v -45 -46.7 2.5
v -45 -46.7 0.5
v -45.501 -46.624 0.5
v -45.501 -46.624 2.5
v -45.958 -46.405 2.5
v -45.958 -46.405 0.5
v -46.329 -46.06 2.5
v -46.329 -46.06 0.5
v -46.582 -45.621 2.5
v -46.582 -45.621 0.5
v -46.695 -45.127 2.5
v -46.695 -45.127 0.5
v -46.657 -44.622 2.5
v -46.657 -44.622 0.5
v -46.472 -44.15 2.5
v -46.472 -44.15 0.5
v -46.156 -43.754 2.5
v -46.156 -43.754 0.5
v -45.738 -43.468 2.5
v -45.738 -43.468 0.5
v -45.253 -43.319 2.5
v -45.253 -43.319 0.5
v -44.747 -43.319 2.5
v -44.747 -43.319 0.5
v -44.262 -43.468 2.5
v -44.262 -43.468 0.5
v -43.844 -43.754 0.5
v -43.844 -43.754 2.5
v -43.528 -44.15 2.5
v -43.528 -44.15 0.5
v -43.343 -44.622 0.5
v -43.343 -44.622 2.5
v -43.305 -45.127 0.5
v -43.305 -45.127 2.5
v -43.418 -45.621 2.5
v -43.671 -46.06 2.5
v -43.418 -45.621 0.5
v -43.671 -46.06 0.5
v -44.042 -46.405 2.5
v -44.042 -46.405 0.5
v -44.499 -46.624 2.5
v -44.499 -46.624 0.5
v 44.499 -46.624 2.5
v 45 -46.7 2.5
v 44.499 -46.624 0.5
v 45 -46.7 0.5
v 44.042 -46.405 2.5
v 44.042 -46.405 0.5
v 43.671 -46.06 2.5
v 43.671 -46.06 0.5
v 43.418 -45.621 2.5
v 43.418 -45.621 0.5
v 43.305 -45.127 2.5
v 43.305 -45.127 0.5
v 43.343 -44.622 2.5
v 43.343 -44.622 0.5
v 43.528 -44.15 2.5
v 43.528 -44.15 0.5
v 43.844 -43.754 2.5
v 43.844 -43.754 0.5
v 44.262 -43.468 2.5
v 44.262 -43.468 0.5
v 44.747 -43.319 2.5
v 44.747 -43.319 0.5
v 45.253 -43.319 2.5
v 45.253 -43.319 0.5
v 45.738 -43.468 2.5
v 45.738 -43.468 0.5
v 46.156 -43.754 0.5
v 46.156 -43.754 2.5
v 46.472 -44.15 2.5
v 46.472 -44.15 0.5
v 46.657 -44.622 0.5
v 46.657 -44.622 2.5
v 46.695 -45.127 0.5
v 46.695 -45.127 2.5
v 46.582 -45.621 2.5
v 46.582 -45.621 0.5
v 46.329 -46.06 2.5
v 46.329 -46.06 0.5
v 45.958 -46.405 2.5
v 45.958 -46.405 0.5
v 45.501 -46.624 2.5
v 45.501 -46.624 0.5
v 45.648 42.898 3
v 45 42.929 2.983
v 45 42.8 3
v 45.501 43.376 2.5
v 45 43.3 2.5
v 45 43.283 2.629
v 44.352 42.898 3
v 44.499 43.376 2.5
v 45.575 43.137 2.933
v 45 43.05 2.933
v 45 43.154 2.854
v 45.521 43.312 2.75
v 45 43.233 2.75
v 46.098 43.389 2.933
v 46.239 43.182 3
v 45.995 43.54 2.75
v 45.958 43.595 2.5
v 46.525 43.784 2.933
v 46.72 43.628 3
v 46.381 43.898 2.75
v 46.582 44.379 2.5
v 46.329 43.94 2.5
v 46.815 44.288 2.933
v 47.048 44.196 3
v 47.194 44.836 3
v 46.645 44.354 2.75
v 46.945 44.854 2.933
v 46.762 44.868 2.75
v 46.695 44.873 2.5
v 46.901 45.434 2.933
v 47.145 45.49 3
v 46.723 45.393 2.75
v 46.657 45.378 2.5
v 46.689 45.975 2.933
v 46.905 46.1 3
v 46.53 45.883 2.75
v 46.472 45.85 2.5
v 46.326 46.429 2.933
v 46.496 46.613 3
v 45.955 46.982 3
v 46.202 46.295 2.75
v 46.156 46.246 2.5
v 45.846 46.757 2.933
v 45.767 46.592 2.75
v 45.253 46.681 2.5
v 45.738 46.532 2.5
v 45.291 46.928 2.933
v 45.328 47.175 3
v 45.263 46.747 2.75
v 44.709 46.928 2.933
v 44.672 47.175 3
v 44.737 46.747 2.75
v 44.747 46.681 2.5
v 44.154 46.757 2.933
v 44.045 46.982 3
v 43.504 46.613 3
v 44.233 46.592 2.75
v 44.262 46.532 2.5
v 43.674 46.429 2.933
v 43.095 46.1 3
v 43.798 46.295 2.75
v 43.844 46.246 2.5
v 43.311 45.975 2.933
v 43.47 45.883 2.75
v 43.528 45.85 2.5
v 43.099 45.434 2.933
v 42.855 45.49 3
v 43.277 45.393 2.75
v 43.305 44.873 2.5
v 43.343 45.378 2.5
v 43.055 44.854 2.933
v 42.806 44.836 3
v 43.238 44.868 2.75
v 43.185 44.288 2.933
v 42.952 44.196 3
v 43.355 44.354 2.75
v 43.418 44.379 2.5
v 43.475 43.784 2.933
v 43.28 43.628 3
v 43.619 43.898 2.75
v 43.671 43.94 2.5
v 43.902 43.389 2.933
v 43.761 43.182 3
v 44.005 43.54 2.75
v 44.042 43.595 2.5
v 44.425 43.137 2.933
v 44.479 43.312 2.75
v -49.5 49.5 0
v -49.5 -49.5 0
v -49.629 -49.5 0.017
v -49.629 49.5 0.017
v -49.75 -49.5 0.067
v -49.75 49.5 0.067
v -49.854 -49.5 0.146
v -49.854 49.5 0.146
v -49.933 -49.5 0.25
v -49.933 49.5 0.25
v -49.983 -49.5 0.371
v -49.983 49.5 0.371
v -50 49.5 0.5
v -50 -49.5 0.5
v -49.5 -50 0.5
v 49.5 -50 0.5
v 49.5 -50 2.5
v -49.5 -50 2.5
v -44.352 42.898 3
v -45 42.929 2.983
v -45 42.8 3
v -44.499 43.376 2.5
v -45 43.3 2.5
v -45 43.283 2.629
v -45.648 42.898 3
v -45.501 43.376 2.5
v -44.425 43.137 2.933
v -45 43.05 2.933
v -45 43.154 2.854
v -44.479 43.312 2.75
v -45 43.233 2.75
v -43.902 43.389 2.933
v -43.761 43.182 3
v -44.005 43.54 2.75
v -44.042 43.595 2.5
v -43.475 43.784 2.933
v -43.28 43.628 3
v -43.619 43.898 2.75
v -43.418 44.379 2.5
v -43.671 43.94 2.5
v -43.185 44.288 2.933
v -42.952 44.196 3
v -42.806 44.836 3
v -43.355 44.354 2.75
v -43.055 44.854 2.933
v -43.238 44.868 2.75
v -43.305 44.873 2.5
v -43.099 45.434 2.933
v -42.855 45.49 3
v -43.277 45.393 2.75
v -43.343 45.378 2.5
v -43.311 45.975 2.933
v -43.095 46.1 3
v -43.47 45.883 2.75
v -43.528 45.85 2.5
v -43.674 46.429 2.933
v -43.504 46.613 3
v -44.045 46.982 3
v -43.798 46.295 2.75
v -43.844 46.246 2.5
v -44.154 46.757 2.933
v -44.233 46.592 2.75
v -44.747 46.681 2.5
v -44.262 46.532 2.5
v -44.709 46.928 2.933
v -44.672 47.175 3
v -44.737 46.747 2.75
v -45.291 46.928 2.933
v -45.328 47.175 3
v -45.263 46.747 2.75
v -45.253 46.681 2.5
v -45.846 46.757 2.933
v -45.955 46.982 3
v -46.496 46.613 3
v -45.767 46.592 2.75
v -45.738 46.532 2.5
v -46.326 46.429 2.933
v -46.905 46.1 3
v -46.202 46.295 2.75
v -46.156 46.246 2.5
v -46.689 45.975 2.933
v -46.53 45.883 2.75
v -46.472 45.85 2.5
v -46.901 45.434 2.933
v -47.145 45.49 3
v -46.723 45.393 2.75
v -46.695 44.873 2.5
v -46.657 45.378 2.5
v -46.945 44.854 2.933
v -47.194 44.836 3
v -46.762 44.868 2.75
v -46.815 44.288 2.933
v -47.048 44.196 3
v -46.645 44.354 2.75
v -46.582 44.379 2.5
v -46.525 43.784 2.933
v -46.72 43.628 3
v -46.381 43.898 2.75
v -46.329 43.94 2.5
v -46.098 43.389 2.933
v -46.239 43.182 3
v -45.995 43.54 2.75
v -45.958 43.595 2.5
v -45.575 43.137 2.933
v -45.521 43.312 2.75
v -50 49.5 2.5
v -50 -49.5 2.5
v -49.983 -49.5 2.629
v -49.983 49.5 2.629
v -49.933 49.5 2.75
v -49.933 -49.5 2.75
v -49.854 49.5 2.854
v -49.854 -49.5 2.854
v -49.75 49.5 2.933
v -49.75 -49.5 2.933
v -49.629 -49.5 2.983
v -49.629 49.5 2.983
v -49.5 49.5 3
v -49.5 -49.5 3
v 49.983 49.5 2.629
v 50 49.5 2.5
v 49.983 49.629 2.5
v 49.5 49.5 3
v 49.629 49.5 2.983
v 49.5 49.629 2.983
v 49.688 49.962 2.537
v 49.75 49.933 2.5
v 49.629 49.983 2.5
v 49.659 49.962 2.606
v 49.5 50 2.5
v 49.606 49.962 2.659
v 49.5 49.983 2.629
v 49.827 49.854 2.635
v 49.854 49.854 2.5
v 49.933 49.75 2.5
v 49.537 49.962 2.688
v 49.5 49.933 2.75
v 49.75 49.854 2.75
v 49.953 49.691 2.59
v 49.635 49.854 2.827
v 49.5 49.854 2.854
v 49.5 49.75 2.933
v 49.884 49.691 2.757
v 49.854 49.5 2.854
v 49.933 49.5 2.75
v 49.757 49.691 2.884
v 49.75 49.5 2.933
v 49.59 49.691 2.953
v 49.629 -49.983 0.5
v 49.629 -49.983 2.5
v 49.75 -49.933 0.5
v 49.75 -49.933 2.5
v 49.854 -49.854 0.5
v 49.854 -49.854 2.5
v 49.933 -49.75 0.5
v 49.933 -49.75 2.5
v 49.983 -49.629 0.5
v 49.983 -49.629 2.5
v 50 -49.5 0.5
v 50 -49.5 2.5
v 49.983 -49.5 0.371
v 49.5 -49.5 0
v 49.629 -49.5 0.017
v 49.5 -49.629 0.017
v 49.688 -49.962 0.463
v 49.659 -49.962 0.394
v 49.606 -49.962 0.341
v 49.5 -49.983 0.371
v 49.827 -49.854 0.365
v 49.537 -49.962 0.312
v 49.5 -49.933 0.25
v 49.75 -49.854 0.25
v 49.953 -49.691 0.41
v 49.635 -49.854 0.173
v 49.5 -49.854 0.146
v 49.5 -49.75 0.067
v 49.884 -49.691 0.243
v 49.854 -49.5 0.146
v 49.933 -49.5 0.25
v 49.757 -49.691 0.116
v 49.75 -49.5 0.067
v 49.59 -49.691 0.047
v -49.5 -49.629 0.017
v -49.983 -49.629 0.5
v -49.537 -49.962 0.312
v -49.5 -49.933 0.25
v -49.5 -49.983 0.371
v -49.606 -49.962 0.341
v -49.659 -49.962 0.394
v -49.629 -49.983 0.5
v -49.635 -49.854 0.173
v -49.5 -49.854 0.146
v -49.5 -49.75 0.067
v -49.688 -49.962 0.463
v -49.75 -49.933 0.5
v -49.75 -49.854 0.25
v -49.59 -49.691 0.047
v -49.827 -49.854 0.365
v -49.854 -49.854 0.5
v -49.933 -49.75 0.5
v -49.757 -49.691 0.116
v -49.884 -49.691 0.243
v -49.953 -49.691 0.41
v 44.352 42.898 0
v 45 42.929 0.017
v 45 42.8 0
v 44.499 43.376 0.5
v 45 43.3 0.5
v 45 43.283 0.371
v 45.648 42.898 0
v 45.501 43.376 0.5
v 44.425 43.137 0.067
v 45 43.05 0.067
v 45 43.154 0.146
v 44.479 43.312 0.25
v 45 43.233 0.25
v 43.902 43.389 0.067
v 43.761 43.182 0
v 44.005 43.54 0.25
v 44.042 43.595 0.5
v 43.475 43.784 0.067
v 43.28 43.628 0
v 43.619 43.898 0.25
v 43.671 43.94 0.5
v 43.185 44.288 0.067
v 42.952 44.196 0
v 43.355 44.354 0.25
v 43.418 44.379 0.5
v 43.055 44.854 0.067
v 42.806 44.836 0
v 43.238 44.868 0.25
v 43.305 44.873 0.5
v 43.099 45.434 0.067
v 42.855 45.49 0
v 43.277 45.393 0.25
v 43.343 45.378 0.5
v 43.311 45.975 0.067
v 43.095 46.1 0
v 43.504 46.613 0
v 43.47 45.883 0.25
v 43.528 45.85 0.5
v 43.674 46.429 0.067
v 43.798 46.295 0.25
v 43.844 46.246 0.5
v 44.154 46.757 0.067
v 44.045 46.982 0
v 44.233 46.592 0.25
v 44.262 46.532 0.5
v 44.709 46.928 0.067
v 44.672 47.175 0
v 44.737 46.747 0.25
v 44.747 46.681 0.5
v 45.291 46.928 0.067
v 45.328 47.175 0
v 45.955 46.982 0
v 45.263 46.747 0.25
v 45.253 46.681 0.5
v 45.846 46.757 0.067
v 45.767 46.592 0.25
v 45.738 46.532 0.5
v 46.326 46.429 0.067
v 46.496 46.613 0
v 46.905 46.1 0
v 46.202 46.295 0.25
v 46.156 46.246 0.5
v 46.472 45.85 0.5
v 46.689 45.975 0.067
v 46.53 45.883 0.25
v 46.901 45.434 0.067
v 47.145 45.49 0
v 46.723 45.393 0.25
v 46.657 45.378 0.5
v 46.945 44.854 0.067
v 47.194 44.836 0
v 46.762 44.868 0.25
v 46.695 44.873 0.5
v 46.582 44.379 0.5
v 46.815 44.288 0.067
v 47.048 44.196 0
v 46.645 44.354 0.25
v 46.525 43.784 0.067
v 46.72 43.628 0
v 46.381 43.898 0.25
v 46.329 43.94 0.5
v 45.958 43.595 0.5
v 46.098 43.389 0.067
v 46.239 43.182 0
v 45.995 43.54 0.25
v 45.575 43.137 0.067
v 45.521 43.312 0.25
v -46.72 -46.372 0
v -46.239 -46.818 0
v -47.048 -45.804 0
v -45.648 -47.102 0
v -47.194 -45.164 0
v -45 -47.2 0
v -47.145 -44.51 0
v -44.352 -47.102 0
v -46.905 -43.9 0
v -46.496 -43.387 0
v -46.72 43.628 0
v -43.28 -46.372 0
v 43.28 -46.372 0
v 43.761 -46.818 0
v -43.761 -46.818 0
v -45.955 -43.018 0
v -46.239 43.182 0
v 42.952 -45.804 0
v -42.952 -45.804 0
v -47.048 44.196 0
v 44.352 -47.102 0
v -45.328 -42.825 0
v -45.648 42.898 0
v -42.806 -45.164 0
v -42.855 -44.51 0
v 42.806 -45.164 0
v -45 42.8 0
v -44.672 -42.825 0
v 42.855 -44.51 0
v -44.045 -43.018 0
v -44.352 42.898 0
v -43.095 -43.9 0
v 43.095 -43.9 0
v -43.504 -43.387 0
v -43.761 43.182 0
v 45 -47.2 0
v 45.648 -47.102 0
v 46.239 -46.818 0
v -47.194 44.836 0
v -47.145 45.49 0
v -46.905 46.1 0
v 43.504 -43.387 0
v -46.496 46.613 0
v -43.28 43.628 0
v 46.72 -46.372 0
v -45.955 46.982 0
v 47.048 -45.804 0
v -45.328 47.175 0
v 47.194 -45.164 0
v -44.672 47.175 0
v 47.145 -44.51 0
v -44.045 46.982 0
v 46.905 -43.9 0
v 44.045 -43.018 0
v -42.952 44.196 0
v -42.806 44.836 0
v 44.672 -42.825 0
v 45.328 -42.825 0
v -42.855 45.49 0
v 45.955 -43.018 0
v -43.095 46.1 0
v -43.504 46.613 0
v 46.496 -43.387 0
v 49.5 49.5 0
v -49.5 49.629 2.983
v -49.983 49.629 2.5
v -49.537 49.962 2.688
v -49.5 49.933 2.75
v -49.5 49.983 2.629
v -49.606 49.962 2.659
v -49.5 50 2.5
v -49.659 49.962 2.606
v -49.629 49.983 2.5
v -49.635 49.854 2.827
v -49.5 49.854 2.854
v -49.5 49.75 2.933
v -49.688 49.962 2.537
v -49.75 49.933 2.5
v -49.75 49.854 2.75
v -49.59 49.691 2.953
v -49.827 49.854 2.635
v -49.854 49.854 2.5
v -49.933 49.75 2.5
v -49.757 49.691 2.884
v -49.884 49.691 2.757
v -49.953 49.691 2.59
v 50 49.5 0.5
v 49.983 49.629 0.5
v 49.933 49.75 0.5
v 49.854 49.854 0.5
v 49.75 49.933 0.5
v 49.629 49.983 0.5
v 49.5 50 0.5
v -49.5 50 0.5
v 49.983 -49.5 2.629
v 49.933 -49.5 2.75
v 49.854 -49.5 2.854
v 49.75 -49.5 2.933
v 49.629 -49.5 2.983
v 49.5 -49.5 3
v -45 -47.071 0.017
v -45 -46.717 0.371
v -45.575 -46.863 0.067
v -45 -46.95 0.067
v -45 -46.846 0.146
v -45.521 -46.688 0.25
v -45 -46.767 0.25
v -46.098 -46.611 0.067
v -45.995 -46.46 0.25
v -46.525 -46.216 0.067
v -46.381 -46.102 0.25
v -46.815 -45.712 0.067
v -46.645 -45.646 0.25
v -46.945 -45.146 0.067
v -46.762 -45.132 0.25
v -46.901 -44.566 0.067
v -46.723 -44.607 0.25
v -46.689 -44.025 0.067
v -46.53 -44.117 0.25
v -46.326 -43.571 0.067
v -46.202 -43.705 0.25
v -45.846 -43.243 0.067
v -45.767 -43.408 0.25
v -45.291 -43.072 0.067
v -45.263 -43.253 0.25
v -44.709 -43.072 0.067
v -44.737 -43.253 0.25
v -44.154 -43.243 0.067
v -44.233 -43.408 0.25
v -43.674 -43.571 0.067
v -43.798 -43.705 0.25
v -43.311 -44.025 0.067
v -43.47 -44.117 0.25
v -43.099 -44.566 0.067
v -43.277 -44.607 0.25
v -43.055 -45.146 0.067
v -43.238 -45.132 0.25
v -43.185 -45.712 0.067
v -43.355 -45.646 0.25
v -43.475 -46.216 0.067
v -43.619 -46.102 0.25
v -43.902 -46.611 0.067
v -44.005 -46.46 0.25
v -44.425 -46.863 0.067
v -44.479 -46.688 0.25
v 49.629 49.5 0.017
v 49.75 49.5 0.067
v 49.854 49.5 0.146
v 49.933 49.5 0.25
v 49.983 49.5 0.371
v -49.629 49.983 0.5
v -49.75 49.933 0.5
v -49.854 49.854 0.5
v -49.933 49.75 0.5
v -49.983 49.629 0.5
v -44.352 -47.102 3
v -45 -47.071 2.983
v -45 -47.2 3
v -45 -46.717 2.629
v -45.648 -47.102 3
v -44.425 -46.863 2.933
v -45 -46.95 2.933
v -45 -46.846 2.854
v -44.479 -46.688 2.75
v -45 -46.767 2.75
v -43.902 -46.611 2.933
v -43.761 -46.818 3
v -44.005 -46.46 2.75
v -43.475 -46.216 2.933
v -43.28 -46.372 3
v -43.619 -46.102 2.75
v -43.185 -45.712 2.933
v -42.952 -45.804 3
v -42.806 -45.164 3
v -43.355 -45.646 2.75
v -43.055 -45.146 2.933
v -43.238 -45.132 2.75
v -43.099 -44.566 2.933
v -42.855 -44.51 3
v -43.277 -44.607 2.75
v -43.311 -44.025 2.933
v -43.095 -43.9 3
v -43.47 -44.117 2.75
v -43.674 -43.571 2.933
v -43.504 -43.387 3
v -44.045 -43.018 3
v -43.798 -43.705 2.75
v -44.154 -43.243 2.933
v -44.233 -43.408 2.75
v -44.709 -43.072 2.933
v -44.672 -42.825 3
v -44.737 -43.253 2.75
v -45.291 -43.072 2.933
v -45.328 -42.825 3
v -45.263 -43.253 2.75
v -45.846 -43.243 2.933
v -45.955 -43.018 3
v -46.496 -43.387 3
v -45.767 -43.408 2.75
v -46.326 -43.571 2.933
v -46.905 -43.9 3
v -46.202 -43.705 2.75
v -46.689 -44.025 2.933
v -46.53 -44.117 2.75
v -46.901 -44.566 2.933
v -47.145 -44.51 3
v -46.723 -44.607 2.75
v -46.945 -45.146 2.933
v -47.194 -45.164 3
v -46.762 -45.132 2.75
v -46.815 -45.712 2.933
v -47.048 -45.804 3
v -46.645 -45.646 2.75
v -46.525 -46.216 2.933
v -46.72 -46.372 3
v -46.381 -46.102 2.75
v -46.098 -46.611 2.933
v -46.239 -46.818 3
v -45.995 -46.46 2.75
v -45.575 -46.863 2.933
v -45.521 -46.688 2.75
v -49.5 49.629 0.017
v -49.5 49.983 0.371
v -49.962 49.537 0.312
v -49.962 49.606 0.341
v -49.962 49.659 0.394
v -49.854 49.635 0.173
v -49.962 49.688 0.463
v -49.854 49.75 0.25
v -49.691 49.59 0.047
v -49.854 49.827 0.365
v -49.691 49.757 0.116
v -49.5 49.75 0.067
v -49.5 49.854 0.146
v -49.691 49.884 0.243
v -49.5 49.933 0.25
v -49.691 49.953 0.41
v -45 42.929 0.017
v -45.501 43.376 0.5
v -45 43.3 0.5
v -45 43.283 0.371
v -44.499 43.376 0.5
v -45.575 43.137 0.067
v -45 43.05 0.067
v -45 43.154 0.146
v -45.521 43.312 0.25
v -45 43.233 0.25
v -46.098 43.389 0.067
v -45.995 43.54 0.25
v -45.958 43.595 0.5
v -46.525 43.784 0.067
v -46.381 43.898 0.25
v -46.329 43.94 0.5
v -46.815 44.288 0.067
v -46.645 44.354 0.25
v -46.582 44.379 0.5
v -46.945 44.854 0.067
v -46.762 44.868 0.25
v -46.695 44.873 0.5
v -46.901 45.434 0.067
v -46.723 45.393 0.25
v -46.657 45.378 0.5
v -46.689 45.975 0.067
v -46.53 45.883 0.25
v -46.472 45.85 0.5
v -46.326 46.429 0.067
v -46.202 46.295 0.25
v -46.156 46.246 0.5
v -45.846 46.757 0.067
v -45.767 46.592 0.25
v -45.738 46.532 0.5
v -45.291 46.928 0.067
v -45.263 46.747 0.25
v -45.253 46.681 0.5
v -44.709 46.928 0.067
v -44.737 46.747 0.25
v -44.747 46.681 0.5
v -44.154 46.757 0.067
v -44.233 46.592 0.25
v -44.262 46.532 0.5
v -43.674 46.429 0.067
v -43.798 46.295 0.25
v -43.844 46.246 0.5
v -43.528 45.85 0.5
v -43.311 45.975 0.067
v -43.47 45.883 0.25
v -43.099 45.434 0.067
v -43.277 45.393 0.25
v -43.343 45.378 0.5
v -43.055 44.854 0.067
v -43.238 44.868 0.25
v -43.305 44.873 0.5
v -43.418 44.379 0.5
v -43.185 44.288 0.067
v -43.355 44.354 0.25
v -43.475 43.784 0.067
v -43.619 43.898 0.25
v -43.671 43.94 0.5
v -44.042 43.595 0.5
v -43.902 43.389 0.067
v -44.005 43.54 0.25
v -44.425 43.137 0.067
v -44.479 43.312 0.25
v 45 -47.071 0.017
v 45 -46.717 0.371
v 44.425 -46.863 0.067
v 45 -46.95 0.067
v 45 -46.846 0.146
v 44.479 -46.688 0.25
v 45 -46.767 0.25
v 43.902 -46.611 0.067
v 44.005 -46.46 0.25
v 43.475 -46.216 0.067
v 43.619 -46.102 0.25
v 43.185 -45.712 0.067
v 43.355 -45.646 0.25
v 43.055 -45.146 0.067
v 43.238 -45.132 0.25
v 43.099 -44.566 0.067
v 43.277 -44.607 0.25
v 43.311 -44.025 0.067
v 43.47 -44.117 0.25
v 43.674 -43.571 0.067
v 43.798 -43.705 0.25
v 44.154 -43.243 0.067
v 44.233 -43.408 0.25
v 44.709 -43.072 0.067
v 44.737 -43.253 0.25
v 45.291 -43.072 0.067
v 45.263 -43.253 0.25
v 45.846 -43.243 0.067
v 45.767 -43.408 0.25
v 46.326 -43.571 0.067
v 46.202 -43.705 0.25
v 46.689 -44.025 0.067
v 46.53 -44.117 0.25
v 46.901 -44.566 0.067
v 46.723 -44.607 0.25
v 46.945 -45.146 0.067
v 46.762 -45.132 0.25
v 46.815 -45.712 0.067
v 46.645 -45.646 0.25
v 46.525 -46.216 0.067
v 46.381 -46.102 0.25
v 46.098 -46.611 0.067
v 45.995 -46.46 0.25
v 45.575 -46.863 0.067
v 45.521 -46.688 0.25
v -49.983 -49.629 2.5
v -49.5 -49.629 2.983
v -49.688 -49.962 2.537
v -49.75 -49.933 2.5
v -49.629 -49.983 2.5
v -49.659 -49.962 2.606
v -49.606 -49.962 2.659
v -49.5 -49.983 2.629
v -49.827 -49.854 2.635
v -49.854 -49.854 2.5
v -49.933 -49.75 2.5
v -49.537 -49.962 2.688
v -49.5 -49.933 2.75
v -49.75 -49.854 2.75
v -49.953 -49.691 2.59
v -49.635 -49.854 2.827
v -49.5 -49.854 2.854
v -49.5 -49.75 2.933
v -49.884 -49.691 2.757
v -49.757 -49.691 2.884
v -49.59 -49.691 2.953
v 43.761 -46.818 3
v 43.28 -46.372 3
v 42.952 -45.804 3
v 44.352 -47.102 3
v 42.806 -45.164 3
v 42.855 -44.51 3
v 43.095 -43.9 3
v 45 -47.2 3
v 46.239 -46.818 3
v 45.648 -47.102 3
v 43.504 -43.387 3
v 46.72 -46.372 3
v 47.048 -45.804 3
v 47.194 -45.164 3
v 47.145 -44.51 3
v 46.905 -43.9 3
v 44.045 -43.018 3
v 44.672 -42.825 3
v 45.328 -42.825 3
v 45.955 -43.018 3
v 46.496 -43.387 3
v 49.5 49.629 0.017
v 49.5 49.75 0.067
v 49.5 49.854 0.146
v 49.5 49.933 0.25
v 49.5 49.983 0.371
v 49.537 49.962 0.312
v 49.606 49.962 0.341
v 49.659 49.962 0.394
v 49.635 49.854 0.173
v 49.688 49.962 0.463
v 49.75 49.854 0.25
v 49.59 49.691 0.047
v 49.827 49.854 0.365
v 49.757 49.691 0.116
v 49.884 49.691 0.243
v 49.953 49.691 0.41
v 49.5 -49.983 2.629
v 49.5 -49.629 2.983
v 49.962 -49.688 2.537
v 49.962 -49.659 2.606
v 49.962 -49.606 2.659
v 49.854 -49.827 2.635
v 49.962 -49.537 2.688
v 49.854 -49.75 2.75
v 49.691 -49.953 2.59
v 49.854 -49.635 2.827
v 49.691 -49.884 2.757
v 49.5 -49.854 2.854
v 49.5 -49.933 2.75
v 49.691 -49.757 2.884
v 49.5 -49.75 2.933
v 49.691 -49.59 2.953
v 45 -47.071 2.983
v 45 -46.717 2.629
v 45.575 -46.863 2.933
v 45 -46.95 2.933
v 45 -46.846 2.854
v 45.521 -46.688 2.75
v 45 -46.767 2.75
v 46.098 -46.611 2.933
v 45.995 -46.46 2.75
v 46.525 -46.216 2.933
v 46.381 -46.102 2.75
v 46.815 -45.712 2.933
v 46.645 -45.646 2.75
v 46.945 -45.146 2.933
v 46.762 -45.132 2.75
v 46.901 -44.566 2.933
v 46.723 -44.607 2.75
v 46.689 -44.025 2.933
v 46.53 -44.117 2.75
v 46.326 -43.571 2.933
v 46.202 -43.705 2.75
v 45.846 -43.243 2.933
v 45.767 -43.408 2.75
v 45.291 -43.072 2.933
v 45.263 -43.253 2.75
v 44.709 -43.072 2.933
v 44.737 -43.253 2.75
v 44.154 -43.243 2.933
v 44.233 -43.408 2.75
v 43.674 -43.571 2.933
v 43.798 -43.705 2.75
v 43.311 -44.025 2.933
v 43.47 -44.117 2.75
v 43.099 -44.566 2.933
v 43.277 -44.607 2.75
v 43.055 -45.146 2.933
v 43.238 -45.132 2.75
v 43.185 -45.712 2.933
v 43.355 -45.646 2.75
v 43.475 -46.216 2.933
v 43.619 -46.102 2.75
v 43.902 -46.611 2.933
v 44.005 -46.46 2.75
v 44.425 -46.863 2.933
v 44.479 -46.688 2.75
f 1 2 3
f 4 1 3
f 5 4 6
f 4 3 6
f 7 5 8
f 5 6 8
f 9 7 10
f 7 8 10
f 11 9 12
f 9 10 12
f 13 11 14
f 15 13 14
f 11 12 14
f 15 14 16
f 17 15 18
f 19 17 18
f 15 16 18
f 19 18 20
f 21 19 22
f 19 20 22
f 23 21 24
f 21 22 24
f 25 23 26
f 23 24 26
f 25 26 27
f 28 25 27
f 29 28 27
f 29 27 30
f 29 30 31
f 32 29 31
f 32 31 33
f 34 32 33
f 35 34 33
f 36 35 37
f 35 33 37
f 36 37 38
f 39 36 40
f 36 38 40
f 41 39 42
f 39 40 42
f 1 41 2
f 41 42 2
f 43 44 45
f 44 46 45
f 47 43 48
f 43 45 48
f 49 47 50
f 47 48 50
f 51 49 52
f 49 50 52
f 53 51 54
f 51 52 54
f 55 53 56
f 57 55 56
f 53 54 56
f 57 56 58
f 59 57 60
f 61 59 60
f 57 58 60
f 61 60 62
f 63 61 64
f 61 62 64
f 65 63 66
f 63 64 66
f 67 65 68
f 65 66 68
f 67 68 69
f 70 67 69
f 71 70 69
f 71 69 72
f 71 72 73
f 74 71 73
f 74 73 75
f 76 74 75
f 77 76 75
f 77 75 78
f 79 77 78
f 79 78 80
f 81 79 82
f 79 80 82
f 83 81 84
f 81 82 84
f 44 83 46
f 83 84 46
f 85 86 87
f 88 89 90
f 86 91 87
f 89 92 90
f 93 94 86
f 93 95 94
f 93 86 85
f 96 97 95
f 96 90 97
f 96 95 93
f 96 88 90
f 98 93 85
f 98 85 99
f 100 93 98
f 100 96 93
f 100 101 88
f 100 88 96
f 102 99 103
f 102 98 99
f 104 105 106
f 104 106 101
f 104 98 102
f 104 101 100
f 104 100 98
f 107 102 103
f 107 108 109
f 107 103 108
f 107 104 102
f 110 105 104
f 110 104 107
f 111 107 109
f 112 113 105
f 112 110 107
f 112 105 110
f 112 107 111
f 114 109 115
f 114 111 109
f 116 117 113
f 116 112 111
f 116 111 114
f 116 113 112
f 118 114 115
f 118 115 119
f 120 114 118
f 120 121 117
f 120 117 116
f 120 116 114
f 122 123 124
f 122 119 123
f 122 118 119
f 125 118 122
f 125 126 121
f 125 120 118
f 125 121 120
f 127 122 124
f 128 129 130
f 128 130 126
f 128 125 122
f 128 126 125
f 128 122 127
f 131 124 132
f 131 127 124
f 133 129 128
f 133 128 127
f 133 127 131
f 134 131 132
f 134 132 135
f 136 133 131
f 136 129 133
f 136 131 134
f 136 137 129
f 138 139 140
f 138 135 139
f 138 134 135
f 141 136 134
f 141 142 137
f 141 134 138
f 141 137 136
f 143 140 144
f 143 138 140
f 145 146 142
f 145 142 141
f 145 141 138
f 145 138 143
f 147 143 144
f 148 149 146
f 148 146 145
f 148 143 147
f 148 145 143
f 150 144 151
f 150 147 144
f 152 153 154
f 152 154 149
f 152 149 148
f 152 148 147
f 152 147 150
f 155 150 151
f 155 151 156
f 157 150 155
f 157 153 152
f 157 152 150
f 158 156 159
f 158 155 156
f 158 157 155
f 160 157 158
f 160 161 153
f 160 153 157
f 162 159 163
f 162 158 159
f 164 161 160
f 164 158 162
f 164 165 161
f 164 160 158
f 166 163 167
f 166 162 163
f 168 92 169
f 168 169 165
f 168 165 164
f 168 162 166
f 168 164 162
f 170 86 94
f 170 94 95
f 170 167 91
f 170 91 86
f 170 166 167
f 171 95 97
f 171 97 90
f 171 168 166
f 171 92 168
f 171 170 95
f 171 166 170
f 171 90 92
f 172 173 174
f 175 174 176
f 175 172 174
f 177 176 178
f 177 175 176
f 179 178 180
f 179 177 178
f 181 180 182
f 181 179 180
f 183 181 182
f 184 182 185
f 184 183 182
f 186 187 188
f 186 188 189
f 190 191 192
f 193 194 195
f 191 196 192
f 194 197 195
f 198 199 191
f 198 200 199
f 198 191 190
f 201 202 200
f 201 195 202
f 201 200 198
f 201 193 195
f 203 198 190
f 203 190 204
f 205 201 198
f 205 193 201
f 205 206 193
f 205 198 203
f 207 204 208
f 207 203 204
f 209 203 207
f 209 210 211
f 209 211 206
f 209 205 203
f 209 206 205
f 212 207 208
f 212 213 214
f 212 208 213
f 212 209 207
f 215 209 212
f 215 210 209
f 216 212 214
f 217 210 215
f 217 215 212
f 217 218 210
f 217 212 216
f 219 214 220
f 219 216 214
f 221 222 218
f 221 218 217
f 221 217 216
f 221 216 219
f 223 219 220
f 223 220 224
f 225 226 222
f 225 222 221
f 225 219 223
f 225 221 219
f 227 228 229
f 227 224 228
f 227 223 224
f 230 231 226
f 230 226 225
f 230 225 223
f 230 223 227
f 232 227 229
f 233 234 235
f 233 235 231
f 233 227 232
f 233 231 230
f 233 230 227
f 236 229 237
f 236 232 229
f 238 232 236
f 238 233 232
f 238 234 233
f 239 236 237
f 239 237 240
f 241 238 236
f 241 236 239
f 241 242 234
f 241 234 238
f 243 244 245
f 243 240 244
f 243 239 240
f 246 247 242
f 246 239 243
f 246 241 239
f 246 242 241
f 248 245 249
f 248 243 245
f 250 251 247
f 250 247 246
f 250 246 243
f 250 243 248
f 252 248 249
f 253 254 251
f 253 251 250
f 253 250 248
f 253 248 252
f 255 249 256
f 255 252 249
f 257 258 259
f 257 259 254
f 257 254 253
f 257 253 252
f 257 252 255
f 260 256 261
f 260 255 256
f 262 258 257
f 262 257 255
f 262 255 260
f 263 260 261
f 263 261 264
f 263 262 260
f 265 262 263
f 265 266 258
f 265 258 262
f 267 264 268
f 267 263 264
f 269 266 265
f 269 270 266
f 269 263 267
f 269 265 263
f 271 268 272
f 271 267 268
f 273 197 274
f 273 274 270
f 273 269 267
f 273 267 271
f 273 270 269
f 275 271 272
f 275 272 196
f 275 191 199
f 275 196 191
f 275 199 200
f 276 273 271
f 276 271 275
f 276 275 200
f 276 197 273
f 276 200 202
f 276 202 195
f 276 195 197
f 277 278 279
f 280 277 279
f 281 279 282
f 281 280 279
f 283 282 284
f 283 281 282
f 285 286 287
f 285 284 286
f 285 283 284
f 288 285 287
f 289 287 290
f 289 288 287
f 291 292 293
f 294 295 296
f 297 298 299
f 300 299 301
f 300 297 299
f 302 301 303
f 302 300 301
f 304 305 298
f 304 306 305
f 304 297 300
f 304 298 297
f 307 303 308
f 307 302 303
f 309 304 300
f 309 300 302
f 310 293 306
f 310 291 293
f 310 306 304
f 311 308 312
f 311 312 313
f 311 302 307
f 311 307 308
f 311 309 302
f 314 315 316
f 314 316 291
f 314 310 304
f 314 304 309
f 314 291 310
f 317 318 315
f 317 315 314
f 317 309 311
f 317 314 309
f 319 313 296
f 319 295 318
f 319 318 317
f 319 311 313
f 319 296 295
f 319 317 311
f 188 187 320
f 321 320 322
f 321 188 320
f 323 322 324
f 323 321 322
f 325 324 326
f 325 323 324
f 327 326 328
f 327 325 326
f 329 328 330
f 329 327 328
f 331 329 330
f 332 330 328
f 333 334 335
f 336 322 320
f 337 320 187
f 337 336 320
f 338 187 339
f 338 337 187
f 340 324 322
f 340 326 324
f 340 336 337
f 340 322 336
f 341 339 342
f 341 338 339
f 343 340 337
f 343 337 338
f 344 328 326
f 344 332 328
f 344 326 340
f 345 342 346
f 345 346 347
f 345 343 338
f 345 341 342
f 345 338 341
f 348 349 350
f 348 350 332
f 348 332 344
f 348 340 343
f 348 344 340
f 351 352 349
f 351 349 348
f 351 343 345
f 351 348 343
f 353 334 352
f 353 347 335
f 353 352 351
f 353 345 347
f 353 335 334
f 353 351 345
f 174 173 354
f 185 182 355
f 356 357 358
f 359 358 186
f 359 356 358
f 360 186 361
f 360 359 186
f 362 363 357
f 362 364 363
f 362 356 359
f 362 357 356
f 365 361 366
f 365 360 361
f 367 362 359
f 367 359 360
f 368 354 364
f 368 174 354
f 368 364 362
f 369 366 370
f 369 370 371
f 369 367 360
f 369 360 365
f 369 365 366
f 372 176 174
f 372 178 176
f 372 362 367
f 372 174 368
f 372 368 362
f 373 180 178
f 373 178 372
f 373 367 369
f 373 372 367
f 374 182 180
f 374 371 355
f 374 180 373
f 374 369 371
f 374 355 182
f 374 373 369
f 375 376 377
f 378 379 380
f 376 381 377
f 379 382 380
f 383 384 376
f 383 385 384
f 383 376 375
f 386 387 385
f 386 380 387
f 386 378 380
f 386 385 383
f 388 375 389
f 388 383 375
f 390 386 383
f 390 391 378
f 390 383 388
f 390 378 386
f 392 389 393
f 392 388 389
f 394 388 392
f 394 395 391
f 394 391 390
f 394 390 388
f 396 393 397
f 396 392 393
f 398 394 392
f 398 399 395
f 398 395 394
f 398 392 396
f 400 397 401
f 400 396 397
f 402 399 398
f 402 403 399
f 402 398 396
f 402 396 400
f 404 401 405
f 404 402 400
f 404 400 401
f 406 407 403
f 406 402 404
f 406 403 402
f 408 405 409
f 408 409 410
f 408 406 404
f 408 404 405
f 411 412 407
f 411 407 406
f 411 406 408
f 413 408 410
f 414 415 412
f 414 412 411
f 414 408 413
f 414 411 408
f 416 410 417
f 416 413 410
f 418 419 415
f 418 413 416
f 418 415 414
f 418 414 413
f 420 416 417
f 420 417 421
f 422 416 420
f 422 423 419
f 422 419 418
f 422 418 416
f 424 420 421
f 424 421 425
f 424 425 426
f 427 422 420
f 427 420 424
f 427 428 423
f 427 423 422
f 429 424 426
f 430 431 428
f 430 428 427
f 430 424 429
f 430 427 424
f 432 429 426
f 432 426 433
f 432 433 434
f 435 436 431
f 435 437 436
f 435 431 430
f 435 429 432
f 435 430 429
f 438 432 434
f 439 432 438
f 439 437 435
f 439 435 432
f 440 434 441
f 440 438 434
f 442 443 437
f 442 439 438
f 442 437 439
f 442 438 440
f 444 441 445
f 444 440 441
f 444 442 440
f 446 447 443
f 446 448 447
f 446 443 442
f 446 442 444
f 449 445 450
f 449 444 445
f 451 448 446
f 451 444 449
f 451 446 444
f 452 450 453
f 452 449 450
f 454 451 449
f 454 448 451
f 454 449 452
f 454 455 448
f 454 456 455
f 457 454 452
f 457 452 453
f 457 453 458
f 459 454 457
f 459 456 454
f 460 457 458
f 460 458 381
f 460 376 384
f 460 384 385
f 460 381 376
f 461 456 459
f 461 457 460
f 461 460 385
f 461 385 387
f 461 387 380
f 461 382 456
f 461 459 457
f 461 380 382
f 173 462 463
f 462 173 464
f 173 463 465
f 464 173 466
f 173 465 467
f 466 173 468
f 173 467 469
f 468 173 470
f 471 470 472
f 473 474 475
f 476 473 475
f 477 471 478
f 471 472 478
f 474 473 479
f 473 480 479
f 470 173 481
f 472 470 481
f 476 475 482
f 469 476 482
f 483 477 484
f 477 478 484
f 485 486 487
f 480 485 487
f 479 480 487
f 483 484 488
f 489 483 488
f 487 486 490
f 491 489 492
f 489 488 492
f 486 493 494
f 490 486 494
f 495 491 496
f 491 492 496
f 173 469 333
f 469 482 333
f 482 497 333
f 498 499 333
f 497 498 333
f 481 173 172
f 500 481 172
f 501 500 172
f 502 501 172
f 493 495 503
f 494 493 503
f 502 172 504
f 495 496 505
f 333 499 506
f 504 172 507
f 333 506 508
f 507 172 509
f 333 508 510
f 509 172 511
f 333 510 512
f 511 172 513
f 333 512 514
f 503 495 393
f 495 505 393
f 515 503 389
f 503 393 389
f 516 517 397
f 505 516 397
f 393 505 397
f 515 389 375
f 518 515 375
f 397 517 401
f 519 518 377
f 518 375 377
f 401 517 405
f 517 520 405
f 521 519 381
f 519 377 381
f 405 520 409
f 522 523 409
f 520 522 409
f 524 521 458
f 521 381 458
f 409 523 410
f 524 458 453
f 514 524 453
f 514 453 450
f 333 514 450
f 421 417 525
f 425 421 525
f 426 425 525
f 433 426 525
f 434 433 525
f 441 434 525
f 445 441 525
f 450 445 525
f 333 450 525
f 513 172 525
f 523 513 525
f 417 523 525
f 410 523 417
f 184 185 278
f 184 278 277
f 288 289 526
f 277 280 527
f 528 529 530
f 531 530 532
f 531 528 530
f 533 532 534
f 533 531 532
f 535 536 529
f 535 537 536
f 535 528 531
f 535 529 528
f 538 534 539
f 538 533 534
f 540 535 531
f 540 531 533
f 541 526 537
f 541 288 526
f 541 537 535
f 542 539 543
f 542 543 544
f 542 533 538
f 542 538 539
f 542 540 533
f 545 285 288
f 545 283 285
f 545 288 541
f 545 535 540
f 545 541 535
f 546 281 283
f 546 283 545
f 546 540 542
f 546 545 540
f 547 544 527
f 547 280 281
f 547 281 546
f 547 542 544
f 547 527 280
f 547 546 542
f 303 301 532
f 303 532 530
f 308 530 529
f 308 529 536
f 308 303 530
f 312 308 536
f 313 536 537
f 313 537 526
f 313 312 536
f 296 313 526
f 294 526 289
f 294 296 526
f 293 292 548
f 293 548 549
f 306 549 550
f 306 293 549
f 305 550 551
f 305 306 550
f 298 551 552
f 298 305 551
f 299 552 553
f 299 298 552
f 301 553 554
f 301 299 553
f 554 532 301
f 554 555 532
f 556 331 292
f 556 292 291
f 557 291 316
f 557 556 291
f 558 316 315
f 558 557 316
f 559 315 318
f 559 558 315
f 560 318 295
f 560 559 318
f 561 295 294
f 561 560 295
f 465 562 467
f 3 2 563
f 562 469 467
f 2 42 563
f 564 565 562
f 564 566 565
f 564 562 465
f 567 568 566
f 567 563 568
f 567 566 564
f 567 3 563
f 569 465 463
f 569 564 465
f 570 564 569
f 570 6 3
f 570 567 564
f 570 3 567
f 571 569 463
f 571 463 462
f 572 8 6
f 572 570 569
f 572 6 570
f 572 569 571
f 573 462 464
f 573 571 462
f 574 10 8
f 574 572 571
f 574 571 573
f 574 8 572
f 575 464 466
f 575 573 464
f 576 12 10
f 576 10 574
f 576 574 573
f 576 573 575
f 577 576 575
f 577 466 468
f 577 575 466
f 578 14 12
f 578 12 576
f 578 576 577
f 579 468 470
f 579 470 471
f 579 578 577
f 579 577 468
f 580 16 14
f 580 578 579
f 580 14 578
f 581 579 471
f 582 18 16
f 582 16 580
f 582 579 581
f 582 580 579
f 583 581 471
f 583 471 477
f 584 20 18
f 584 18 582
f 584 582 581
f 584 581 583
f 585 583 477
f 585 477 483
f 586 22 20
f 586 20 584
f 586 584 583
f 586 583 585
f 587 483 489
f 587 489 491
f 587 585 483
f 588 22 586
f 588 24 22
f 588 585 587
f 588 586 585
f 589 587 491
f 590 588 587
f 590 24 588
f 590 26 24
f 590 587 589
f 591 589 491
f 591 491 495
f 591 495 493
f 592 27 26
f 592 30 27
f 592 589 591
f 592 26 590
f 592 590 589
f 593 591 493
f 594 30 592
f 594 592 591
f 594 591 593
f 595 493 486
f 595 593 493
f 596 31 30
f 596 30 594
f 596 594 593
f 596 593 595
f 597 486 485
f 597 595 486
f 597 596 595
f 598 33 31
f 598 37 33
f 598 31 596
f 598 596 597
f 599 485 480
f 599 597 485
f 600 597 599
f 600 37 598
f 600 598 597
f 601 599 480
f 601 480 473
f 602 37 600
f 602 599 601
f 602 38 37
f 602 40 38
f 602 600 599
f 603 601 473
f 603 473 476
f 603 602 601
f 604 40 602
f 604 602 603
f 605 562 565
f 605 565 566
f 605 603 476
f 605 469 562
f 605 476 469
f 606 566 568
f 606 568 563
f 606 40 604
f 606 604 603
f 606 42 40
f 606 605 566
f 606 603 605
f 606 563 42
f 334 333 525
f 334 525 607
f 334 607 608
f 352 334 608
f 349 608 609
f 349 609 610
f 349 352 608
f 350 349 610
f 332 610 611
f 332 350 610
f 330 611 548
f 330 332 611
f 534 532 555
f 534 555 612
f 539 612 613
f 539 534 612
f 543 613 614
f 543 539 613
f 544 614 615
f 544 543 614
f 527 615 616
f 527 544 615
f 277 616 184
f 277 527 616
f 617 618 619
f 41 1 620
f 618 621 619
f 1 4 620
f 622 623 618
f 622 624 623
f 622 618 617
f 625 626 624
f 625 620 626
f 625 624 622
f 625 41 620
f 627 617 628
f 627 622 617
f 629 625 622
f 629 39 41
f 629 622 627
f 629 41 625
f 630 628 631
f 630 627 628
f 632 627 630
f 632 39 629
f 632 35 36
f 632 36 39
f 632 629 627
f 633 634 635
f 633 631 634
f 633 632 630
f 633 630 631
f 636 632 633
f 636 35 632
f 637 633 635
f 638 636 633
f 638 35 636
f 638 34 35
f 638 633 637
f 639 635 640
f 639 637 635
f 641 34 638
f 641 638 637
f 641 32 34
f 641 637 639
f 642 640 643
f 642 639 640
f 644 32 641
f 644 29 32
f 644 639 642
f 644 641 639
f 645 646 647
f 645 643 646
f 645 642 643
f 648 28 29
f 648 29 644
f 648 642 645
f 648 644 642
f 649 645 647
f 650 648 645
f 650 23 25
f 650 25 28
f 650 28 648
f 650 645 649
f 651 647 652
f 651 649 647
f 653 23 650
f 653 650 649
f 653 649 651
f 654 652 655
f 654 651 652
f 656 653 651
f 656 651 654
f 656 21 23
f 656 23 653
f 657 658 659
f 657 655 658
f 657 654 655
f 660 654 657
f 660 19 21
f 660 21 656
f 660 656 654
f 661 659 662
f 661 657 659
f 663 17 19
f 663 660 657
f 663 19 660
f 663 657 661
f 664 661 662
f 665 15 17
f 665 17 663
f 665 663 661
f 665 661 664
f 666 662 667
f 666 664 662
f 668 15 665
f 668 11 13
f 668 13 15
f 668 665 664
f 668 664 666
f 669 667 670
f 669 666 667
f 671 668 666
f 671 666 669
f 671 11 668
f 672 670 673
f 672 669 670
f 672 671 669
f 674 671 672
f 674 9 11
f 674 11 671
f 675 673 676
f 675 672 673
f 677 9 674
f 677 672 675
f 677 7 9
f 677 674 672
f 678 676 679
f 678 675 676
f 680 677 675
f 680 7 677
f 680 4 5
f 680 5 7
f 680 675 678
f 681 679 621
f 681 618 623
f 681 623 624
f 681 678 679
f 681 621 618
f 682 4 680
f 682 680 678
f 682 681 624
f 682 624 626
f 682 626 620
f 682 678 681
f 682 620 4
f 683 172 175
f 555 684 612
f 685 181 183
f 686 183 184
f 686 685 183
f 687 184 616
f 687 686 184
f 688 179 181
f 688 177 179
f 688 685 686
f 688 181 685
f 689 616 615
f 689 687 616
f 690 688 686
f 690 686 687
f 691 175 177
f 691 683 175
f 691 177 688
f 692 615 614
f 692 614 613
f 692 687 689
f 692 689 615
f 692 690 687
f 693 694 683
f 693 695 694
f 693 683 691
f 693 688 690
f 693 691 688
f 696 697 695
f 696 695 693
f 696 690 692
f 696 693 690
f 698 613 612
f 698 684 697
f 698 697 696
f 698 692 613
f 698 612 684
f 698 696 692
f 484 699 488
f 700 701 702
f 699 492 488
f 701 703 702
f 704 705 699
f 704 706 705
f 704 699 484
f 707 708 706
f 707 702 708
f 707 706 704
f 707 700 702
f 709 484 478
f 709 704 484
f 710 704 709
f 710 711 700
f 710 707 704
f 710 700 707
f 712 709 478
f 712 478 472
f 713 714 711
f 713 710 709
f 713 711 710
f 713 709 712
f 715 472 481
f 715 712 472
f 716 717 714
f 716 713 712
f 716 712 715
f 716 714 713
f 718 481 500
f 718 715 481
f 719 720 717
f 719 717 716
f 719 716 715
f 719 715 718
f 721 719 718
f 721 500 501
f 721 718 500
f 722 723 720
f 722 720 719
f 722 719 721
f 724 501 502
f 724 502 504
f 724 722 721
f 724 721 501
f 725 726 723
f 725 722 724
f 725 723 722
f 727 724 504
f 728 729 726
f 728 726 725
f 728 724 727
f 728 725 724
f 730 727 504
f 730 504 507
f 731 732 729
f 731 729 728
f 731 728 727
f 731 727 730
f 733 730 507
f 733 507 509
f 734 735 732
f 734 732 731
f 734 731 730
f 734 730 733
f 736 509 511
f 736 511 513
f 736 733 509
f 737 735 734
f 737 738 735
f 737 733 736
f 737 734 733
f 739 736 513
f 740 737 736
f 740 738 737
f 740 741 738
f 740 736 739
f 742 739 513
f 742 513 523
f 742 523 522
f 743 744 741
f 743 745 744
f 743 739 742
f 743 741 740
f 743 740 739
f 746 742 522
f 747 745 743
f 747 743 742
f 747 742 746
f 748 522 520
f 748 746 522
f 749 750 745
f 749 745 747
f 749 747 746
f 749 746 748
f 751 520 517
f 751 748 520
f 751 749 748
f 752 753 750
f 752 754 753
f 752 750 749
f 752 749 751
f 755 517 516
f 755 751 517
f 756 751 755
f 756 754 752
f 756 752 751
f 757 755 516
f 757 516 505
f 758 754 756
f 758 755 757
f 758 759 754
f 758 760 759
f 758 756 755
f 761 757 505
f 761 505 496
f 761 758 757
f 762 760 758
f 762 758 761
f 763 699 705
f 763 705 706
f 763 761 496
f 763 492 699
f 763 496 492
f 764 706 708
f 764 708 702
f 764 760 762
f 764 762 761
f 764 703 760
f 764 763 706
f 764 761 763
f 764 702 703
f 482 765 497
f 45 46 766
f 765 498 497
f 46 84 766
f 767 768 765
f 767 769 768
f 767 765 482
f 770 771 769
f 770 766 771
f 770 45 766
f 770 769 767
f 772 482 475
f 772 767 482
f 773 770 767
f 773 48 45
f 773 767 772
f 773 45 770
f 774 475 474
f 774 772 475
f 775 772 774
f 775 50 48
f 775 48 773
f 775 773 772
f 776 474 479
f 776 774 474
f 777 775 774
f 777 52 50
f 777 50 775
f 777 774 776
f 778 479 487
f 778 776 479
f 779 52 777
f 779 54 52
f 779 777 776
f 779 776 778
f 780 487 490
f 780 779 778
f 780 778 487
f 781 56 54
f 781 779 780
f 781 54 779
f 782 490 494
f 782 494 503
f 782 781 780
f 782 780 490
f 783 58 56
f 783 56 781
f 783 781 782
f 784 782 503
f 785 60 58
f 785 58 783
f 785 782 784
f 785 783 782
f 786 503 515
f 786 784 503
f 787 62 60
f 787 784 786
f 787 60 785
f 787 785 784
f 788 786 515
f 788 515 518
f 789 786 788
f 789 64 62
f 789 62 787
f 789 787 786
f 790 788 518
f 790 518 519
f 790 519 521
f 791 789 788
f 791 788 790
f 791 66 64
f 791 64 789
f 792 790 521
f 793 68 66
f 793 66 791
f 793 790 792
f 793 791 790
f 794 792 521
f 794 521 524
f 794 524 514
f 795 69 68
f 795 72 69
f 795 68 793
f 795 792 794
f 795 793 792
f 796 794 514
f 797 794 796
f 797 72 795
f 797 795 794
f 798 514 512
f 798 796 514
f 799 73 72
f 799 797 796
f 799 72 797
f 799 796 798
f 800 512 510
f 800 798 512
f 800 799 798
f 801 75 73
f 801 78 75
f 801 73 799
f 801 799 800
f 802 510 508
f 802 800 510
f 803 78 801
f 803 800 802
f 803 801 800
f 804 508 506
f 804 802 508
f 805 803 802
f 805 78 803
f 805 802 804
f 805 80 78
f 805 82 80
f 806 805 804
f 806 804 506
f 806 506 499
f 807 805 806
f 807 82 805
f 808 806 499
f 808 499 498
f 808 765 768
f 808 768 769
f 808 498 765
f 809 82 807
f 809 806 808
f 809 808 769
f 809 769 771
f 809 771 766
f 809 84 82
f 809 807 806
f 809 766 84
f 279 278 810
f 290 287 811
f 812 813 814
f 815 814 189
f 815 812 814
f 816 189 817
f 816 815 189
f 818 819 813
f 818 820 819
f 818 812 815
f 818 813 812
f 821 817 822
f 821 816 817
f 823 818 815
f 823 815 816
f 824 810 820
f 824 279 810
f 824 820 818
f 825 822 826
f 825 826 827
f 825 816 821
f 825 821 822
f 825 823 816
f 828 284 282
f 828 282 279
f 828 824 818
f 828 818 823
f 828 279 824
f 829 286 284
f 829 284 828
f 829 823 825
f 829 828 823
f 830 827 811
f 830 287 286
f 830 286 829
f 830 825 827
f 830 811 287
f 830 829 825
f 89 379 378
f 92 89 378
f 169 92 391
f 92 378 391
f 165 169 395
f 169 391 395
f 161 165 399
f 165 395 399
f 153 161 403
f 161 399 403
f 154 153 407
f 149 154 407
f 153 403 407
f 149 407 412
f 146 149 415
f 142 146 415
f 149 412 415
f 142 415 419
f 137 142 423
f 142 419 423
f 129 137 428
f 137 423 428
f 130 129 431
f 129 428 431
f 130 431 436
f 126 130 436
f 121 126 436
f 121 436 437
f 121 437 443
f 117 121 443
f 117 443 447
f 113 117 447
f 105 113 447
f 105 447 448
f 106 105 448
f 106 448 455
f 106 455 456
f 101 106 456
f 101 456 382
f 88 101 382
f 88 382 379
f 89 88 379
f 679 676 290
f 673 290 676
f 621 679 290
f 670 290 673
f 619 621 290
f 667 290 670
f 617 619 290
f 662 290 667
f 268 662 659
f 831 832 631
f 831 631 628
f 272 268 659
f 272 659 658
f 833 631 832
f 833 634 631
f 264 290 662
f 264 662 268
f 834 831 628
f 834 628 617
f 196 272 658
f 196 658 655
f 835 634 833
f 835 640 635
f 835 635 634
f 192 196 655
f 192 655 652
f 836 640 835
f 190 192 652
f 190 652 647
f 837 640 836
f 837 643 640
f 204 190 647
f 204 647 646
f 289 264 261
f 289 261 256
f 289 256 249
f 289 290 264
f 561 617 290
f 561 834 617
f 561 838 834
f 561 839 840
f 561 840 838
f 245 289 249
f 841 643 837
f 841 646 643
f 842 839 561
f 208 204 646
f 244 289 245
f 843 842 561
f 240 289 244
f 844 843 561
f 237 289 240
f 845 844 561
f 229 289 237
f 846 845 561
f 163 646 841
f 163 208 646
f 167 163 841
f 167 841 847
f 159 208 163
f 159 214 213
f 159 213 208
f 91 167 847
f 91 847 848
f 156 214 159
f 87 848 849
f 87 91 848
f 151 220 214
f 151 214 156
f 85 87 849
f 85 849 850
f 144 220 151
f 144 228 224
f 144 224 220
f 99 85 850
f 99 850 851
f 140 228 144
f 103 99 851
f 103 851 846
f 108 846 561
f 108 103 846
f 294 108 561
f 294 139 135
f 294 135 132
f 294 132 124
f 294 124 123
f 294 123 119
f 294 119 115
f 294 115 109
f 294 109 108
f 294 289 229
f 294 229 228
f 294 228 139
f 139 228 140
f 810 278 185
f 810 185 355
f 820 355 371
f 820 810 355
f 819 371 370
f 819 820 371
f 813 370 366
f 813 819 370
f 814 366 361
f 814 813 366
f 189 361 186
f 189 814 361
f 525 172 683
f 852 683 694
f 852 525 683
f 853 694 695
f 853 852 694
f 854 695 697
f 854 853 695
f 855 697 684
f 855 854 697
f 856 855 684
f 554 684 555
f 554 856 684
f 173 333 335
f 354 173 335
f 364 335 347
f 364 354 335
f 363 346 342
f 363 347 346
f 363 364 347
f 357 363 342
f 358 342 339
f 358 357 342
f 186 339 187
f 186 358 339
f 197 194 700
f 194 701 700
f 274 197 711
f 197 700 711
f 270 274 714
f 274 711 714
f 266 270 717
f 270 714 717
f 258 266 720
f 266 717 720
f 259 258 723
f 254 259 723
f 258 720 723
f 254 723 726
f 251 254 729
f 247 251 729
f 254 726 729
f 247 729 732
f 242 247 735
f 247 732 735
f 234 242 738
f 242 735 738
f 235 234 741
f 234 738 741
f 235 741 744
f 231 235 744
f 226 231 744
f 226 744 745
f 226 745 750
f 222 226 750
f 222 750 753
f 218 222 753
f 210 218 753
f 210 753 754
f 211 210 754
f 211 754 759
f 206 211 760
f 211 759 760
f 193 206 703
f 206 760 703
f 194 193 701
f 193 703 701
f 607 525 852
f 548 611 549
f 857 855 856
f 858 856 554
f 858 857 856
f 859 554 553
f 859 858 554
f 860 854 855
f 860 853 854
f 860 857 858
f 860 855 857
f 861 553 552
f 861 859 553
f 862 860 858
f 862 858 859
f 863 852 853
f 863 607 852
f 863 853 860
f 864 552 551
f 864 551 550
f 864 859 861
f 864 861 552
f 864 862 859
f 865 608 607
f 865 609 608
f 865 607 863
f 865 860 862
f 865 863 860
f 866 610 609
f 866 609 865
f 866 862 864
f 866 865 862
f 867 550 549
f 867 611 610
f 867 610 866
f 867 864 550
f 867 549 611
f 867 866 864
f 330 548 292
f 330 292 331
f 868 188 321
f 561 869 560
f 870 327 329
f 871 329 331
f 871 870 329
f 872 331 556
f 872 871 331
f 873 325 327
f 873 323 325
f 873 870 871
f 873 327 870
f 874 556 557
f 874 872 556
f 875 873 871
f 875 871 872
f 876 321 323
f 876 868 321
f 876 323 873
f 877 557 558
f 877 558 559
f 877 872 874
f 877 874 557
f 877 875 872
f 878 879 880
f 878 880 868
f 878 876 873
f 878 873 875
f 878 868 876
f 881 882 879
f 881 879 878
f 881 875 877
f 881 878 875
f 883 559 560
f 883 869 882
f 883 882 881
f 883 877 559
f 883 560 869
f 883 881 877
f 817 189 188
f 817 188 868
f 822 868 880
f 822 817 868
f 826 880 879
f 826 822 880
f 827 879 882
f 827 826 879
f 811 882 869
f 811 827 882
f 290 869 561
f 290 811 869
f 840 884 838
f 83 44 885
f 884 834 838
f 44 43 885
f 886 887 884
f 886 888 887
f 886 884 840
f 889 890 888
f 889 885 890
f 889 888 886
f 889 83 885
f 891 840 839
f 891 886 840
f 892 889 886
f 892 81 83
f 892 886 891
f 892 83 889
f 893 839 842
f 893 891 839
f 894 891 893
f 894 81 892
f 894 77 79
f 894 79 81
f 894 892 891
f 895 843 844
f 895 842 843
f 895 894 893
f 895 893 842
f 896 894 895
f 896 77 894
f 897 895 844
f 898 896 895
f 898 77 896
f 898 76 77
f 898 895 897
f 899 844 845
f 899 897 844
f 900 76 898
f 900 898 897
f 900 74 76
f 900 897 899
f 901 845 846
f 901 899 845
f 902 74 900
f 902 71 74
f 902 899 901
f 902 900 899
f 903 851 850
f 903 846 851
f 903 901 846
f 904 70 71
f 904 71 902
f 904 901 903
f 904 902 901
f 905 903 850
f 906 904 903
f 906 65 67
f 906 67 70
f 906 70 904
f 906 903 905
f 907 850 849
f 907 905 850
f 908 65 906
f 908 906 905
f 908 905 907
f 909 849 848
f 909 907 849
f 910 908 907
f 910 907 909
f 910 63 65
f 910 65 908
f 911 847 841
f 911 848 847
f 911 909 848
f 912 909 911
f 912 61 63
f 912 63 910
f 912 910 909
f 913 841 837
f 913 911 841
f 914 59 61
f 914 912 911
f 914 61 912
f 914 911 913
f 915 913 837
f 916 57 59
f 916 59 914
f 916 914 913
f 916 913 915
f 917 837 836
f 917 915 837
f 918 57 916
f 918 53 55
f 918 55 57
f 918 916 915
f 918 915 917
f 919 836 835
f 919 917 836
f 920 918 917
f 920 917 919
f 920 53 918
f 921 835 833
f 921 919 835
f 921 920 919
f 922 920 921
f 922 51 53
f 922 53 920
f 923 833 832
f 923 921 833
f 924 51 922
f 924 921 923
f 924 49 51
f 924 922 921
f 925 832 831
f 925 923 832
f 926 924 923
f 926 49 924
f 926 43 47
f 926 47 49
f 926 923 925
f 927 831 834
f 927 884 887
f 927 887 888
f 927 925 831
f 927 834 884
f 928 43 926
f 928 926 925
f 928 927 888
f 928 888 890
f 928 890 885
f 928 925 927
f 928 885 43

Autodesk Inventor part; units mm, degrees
ref_plane "YZ Plane" through (0, 0, 0) normal (1, 0, 0) x (0, 1, 0)
ref_plane "XZ Plane" through (0, 0, 0) normal (0, 1, 0) x (-1, 0, 0)
ref_plane "XY Plane" through (0, 0, 0) normal (0, 0, 1) x (1, 0, 0)
sketch "Sketch1" plane through (0, 0, 0) normal (0, 0, 1) x (1, 0, 0)
  line L0 (-50, 50) -> (50, 50)
  line L1 (50, 50) -> (50, -50)
  line L2 (50, -50) -> (-50, -50)
  line L3 (-50, -50) -> (-50, 50)
  point P0 (0, 0)
  dimension "d0" = 100
  dimension "d1" = 100
  dimension "d2" = 50
  dimension "d3" = 50
extrude "Extrusion1" add sketch "Sketch1" along normal blind 3
hole "Hole1" at (-45, 45, 3) direction (0, 0, -1) diameter 3.4 end through all clearance for "Flat Head Machine Screw" size "M3" standard "Ansi Metric M Profile"
hole "Hole2" at (45, 45, 3) direction (0, 0, -1) diameter 3.4 end through all clearance for "Flat Head Machine Screw" size "M3" standard "Ansi Metric M Profile"
hole "Hole3" at (-45, -45, 3) direction (0, 0, -1) diameter 3.4 end through all clearance for "Flat Head Machine Screw" size "M3" standard "Ansi Metric M Profile"
hole "Hole4" at (45, -45, 3) direction (0, 0, -1) diameter 3.4 end through all clearance for "Flat Head Machine Screw" size "M3" standard "Ansi Metric M Profile"
fillet "Fillet1" radius 0.5 20 edges at (-50, 0, 3) (0, -50, 3) (50, 0, 3) (0, 50, 3) (-45, 46.7, 3) (-45, 46.7, 0) (45, 46.7, 3) (45, 46.7, 0) (50, 0, 0) (0, 50, 0) (-50, 0, 0) (0, -50, 0) (45, -43.3, 3) (45, -43.3, 0) (-45, -43.3, 3) (-45, -43.3, 0) (50, 50, 1.5) (50, -50, 1.5) (-50, -50, 1.5) (-50, 50, 1.5)
equation "\"d1\" = d0"
equation "\"d2\" = 0.5 * d0"
equation "\"d3\" = 0.5 * d0"
properties part number "Platform" material "Polycarbonate, Clear"
